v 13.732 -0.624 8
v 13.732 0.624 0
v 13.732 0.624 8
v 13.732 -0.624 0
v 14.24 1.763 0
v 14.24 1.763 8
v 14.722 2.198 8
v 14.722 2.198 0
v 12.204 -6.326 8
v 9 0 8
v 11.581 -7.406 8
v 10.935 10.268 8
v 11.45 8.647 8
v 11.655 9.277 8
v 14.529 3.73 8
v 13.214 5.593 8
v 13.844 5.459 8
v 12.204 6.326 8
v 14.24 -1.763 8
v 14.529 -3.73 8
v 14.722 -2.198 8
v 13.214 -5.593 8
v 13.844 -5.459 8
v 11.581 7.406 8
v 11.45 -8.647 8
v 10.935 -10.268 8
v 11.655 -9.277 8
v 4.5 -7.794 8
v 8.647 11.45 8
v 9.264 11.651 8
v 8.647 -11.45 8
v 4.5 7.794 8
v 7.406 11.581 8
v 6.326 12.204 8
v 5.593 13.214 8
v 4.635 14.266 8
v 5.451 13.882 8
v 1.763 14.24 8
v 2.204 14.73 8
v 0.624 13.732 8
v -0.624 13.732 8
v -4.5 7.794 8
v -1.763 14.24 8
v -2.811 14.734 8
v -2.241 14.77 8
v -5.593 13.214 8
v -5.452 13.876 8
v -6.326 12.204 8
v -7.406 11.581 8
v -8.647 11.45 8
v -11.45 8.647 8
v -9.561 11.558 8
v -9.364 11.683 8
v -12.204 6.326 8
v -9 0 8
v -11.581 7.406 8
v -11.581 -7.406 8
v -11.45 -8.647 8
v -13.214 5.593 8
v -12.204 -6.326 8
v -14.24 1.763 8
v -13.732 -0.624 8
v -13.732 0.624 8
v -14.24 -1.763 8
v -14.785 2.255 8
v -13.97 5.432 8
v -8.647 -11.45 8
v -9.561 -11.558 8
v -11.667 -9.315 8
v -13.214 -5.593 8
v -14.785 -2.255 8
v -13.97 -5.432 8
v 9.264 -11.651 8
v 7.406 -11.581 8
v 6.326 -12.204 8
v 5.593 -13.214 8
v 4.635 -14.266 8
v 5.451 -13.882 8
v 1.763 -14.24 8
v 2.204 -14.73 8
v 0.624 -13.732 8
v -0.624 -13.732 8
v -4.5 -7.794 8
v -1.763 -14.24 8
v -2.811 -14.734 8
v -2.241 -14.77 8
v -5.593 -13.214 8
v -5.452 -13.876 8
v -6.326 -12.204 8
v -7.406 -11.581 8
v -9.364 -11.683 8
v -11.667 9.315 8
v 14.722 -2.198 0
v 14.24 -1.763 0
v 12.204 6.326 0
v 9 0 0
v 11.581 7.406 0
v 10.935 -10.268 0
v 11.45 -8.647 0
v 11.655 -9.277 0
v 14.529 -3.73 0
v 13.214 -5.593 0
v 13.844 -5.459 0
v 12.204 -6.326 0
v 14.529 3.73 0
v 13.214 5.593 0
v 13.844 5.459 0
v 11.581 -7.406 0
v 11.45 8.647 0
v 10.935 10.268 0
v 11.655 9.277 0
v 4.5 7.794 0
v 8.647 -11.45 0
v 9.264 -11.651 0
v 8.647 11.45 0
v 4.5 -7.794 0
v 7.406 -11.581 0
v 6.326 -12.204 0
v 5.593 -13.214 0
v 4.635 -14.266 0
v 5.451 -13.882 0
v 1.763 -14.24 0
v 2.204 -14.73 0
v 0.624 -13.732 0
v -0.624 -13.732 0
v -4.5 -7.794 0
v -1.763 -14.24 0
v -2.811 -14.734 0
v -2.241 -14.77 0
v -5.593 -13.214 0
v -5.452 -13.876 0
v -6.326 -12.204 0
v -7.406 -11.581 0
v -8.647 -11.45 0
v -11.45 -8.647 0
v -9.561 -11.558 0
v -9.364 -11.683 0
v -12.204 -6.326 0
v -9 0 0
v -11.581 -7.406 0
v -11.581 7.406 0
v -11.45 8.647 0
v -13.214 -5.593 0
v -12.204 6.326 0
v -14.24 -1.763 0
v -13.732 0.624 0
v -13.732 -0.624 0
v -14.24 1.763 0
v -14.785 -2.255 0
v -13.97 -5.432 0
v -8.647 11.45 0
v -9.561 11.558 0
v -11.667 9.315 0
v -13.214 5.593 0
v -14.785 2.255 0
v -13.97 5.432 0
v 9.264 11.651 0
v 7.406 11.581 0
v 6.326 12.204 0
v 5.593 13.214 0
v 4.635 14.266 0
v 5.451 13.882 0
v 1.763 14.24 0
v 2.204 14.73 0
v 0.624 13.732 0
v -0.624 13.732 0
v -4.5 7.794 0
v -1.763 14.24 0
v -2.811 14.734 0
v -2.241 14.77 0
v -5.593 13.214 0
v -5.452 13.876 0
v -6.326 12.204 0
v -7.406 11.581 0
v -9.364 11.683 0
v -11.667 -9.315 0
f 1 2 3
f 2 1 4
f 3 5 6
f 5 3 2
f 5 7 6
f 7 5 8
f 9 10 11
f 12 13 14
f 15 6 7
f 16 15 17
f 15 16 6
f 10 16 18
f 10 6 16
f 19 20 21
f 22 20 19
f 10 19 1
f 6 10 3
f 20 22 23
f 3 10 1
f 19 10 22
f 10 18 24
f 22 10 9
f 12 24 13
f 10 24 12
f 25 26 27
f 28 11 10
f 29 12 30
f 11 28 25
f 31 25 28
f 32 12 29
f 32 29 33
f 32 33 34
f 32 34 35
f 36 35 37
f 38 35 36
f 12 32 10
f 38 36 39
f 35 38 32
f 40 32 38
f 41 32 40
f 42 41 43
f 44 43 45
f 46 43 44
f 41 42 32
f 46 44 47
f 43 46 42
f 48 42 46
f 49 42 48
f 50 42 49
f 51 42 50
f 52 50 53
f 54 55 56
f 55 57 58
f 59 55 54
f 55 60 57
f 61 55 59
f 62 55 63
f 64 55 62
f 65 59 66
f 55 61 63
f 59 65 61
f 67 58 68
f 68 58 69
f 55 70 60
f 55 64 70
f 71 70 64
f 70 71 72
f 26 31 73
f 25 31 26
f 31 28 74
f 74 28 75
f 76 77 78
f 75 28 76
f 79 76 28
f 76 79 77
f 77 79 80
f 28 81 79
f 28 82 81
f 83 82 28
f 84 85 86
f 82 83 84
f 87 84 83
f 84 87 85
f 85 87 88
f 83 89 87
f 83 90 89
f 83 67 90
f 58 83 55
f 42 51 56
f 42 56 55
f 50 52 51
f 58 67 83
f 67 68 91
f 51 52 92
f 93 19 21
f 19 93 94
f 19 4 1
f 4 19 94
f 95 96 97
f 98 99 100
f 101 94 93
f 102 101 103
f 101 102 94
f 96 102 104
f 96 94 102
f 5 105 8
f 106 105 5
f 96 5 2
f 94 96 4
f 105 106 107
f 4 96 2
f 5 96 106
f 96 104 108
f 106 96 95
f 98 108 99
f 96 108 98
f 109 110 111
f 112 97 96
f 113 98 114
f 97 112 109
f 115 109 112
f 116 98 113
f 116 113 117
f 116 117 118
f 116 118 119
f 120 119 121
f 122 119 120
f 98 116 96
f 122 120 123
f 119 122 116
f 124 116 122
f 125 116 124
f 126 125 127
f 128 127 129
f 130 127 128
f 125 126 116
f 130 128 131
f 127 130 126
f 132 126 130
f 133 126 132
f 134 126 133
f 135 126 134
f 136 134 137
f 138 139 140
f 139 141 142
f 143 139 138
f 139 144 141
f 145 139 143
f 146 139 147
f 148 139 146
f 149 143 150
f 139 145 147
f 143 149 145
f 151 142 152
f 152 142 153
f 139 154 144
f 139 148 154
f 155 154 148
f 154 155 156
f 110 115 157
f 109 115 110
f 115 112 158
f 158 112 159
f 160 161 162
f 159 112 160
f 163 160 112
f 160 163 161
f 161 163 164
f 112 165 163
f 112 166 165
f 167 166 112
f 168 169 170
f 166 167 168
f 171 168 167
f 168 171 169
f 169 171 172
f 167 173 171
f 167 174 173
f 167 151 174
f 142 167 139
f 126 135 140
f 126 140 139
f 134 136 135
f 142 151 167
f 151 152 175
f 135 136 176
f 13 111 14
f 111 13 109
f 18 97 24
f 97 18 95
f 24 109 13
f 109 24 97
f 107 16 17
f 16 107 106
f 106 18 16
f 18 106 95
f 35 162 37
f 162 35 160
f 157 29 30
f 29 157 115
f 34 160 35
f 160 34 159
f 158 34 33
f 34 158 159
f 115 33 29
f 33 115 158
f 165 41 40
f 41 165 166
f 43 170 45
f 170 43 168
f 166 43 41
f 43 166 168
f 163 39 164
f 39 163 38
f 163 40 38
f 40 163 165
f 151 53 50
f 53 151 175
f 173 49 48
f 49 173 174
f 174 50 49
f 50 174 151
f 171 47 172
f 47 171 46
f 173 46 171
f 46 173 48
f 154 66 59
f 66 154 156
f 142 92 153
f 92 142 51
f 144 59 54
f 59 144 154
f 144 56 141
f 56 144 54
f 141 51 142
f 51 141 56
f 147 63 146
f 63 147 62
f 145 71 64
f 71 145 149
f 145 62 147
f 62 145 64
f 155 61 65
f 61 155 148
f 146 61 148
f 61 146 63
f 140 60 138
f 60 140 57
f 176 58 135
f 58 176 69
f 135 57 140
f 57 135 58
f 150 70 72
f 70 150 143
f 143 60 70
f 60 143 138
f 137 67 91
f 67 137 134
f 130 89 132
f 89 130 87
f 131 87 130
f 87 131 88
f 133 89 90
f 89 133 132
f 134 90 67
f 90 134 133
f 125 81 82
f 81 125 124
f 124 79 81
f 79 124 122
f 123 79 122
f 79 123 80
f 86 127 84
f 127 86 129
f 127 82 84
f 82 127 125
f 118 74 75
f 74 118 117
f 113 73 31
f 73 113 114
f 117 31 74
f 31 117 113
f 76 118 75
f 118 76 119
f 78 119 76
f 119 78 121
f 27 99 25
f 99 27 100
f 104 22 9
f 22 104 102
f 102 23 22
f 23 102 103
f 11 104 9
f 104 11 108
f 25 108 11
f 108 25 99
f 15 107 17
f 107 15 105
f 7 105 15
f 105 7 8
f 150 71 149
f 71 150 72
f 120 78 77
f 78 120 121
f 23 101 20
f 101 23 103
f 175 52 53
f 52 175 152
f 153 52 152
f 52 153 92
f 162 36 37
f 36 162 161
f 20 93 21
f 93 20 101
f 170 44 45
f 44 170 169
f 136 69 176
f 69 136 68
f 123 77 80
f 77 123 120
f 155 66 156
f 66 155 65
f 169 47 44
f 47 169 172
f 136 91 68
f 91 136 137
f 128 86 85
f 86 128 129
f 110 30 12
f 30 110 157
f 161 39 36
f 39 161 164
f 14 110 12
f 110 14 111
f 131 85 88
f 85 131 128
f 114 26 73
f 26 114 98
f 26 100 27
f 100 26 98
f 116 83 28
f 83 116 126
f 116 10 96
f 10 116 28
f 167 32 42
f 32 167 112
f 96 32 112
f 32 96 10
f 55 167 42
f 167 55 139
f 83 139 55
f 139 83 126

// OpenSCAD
// Knurled hex nut holder
// Glyn Cowles Feb 2015

// Total diameter of knob
totd=30;
// Height of knob
height=8;
// Nut diameter (point to point not flat to flat)
nutd=18;
// Number of knurls
knurls=12;

difference() {
    cylinder(h=height,r=totd/2,$fn=25);
    cylinder(h=height,r=nutd/2,$fn=6);
    for (r=[0:360/knurls:360]) {
        rotate([0,0,r]) translate([totd/1.8,0,0]) cylinder(h=height,r=(totd/5)/2,$fn=15);
    }
}
